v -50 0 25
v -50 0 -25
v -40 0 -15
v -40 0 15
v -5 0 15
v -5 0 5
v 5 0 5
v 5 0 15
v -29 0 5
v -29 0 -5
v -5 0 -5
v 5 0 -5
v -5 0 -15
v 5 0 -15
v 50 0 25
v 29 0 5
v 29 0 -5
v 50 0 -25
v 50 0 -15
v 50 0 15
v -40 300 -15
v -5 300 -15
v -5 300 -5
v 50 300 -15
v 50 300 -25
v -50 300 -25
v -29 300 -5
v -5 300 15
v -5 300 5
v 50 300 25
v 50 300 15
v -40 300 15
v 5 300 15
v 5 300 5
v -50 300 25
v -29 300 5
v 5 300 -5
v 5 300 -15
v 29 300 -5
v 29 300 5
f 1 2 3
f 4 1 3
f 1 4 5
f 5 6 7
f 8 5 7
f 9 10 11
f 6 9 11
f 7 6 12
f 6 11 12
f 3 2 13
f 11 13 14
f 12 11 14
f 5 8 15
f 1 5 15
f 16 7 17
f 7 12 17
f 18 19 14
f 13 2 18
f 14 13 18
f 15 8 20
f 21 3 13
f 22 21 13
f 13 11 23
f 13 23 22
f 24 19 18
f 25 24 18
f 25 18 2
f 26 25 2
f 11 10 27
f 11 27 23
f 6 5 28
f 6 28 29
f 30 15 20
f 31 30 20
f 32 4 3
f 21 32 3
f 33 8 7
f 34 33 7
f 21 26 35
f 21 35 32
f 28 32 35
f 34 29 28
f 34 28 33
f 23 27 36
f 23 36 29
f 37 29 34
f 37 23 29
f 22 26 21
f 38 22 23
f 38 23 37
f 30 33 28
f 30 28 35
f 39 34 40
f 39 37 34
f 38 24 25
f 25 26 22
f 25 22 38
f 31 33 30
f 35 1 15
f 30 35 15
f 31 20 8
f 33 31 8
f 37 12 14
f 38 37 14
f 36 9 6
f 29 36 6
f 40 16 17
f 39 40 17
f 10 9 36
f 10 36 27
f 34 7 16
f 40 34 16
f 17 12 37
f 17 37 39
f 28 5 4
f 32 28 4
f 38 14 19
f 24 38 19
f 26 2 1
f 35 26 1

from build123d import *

# Parameters (mm, degrees)
EXTRUDE_1_DEPTH = 300


with BuildPart() as part:
    # Эскиз1 → Бобышка-Вытянуть1 (new body)
    with BuildSketch(Plane(origin=(0, 0, 0), x_dir=(1, 0, 0), z_dir=(0, 1, 0))):
        Polygon((5, -15), (5, -5), (29, -5), (29, 5), (5, 5), (5, 15), (50, 15), (50, 25), (-50, 25), (-50, -25), (50, -25), (50, -15), align=None)
        Polygon((-40, -15), (-40, 15), (-5, 15), (-5, 5), (-29, 5), (-29, -5), (-5, -5), (-5, -15), align=None, mode=Mode.SUBTRACT)
    extrude(amount=EXTRUDE_1_DEPTH)


solid = part.part
